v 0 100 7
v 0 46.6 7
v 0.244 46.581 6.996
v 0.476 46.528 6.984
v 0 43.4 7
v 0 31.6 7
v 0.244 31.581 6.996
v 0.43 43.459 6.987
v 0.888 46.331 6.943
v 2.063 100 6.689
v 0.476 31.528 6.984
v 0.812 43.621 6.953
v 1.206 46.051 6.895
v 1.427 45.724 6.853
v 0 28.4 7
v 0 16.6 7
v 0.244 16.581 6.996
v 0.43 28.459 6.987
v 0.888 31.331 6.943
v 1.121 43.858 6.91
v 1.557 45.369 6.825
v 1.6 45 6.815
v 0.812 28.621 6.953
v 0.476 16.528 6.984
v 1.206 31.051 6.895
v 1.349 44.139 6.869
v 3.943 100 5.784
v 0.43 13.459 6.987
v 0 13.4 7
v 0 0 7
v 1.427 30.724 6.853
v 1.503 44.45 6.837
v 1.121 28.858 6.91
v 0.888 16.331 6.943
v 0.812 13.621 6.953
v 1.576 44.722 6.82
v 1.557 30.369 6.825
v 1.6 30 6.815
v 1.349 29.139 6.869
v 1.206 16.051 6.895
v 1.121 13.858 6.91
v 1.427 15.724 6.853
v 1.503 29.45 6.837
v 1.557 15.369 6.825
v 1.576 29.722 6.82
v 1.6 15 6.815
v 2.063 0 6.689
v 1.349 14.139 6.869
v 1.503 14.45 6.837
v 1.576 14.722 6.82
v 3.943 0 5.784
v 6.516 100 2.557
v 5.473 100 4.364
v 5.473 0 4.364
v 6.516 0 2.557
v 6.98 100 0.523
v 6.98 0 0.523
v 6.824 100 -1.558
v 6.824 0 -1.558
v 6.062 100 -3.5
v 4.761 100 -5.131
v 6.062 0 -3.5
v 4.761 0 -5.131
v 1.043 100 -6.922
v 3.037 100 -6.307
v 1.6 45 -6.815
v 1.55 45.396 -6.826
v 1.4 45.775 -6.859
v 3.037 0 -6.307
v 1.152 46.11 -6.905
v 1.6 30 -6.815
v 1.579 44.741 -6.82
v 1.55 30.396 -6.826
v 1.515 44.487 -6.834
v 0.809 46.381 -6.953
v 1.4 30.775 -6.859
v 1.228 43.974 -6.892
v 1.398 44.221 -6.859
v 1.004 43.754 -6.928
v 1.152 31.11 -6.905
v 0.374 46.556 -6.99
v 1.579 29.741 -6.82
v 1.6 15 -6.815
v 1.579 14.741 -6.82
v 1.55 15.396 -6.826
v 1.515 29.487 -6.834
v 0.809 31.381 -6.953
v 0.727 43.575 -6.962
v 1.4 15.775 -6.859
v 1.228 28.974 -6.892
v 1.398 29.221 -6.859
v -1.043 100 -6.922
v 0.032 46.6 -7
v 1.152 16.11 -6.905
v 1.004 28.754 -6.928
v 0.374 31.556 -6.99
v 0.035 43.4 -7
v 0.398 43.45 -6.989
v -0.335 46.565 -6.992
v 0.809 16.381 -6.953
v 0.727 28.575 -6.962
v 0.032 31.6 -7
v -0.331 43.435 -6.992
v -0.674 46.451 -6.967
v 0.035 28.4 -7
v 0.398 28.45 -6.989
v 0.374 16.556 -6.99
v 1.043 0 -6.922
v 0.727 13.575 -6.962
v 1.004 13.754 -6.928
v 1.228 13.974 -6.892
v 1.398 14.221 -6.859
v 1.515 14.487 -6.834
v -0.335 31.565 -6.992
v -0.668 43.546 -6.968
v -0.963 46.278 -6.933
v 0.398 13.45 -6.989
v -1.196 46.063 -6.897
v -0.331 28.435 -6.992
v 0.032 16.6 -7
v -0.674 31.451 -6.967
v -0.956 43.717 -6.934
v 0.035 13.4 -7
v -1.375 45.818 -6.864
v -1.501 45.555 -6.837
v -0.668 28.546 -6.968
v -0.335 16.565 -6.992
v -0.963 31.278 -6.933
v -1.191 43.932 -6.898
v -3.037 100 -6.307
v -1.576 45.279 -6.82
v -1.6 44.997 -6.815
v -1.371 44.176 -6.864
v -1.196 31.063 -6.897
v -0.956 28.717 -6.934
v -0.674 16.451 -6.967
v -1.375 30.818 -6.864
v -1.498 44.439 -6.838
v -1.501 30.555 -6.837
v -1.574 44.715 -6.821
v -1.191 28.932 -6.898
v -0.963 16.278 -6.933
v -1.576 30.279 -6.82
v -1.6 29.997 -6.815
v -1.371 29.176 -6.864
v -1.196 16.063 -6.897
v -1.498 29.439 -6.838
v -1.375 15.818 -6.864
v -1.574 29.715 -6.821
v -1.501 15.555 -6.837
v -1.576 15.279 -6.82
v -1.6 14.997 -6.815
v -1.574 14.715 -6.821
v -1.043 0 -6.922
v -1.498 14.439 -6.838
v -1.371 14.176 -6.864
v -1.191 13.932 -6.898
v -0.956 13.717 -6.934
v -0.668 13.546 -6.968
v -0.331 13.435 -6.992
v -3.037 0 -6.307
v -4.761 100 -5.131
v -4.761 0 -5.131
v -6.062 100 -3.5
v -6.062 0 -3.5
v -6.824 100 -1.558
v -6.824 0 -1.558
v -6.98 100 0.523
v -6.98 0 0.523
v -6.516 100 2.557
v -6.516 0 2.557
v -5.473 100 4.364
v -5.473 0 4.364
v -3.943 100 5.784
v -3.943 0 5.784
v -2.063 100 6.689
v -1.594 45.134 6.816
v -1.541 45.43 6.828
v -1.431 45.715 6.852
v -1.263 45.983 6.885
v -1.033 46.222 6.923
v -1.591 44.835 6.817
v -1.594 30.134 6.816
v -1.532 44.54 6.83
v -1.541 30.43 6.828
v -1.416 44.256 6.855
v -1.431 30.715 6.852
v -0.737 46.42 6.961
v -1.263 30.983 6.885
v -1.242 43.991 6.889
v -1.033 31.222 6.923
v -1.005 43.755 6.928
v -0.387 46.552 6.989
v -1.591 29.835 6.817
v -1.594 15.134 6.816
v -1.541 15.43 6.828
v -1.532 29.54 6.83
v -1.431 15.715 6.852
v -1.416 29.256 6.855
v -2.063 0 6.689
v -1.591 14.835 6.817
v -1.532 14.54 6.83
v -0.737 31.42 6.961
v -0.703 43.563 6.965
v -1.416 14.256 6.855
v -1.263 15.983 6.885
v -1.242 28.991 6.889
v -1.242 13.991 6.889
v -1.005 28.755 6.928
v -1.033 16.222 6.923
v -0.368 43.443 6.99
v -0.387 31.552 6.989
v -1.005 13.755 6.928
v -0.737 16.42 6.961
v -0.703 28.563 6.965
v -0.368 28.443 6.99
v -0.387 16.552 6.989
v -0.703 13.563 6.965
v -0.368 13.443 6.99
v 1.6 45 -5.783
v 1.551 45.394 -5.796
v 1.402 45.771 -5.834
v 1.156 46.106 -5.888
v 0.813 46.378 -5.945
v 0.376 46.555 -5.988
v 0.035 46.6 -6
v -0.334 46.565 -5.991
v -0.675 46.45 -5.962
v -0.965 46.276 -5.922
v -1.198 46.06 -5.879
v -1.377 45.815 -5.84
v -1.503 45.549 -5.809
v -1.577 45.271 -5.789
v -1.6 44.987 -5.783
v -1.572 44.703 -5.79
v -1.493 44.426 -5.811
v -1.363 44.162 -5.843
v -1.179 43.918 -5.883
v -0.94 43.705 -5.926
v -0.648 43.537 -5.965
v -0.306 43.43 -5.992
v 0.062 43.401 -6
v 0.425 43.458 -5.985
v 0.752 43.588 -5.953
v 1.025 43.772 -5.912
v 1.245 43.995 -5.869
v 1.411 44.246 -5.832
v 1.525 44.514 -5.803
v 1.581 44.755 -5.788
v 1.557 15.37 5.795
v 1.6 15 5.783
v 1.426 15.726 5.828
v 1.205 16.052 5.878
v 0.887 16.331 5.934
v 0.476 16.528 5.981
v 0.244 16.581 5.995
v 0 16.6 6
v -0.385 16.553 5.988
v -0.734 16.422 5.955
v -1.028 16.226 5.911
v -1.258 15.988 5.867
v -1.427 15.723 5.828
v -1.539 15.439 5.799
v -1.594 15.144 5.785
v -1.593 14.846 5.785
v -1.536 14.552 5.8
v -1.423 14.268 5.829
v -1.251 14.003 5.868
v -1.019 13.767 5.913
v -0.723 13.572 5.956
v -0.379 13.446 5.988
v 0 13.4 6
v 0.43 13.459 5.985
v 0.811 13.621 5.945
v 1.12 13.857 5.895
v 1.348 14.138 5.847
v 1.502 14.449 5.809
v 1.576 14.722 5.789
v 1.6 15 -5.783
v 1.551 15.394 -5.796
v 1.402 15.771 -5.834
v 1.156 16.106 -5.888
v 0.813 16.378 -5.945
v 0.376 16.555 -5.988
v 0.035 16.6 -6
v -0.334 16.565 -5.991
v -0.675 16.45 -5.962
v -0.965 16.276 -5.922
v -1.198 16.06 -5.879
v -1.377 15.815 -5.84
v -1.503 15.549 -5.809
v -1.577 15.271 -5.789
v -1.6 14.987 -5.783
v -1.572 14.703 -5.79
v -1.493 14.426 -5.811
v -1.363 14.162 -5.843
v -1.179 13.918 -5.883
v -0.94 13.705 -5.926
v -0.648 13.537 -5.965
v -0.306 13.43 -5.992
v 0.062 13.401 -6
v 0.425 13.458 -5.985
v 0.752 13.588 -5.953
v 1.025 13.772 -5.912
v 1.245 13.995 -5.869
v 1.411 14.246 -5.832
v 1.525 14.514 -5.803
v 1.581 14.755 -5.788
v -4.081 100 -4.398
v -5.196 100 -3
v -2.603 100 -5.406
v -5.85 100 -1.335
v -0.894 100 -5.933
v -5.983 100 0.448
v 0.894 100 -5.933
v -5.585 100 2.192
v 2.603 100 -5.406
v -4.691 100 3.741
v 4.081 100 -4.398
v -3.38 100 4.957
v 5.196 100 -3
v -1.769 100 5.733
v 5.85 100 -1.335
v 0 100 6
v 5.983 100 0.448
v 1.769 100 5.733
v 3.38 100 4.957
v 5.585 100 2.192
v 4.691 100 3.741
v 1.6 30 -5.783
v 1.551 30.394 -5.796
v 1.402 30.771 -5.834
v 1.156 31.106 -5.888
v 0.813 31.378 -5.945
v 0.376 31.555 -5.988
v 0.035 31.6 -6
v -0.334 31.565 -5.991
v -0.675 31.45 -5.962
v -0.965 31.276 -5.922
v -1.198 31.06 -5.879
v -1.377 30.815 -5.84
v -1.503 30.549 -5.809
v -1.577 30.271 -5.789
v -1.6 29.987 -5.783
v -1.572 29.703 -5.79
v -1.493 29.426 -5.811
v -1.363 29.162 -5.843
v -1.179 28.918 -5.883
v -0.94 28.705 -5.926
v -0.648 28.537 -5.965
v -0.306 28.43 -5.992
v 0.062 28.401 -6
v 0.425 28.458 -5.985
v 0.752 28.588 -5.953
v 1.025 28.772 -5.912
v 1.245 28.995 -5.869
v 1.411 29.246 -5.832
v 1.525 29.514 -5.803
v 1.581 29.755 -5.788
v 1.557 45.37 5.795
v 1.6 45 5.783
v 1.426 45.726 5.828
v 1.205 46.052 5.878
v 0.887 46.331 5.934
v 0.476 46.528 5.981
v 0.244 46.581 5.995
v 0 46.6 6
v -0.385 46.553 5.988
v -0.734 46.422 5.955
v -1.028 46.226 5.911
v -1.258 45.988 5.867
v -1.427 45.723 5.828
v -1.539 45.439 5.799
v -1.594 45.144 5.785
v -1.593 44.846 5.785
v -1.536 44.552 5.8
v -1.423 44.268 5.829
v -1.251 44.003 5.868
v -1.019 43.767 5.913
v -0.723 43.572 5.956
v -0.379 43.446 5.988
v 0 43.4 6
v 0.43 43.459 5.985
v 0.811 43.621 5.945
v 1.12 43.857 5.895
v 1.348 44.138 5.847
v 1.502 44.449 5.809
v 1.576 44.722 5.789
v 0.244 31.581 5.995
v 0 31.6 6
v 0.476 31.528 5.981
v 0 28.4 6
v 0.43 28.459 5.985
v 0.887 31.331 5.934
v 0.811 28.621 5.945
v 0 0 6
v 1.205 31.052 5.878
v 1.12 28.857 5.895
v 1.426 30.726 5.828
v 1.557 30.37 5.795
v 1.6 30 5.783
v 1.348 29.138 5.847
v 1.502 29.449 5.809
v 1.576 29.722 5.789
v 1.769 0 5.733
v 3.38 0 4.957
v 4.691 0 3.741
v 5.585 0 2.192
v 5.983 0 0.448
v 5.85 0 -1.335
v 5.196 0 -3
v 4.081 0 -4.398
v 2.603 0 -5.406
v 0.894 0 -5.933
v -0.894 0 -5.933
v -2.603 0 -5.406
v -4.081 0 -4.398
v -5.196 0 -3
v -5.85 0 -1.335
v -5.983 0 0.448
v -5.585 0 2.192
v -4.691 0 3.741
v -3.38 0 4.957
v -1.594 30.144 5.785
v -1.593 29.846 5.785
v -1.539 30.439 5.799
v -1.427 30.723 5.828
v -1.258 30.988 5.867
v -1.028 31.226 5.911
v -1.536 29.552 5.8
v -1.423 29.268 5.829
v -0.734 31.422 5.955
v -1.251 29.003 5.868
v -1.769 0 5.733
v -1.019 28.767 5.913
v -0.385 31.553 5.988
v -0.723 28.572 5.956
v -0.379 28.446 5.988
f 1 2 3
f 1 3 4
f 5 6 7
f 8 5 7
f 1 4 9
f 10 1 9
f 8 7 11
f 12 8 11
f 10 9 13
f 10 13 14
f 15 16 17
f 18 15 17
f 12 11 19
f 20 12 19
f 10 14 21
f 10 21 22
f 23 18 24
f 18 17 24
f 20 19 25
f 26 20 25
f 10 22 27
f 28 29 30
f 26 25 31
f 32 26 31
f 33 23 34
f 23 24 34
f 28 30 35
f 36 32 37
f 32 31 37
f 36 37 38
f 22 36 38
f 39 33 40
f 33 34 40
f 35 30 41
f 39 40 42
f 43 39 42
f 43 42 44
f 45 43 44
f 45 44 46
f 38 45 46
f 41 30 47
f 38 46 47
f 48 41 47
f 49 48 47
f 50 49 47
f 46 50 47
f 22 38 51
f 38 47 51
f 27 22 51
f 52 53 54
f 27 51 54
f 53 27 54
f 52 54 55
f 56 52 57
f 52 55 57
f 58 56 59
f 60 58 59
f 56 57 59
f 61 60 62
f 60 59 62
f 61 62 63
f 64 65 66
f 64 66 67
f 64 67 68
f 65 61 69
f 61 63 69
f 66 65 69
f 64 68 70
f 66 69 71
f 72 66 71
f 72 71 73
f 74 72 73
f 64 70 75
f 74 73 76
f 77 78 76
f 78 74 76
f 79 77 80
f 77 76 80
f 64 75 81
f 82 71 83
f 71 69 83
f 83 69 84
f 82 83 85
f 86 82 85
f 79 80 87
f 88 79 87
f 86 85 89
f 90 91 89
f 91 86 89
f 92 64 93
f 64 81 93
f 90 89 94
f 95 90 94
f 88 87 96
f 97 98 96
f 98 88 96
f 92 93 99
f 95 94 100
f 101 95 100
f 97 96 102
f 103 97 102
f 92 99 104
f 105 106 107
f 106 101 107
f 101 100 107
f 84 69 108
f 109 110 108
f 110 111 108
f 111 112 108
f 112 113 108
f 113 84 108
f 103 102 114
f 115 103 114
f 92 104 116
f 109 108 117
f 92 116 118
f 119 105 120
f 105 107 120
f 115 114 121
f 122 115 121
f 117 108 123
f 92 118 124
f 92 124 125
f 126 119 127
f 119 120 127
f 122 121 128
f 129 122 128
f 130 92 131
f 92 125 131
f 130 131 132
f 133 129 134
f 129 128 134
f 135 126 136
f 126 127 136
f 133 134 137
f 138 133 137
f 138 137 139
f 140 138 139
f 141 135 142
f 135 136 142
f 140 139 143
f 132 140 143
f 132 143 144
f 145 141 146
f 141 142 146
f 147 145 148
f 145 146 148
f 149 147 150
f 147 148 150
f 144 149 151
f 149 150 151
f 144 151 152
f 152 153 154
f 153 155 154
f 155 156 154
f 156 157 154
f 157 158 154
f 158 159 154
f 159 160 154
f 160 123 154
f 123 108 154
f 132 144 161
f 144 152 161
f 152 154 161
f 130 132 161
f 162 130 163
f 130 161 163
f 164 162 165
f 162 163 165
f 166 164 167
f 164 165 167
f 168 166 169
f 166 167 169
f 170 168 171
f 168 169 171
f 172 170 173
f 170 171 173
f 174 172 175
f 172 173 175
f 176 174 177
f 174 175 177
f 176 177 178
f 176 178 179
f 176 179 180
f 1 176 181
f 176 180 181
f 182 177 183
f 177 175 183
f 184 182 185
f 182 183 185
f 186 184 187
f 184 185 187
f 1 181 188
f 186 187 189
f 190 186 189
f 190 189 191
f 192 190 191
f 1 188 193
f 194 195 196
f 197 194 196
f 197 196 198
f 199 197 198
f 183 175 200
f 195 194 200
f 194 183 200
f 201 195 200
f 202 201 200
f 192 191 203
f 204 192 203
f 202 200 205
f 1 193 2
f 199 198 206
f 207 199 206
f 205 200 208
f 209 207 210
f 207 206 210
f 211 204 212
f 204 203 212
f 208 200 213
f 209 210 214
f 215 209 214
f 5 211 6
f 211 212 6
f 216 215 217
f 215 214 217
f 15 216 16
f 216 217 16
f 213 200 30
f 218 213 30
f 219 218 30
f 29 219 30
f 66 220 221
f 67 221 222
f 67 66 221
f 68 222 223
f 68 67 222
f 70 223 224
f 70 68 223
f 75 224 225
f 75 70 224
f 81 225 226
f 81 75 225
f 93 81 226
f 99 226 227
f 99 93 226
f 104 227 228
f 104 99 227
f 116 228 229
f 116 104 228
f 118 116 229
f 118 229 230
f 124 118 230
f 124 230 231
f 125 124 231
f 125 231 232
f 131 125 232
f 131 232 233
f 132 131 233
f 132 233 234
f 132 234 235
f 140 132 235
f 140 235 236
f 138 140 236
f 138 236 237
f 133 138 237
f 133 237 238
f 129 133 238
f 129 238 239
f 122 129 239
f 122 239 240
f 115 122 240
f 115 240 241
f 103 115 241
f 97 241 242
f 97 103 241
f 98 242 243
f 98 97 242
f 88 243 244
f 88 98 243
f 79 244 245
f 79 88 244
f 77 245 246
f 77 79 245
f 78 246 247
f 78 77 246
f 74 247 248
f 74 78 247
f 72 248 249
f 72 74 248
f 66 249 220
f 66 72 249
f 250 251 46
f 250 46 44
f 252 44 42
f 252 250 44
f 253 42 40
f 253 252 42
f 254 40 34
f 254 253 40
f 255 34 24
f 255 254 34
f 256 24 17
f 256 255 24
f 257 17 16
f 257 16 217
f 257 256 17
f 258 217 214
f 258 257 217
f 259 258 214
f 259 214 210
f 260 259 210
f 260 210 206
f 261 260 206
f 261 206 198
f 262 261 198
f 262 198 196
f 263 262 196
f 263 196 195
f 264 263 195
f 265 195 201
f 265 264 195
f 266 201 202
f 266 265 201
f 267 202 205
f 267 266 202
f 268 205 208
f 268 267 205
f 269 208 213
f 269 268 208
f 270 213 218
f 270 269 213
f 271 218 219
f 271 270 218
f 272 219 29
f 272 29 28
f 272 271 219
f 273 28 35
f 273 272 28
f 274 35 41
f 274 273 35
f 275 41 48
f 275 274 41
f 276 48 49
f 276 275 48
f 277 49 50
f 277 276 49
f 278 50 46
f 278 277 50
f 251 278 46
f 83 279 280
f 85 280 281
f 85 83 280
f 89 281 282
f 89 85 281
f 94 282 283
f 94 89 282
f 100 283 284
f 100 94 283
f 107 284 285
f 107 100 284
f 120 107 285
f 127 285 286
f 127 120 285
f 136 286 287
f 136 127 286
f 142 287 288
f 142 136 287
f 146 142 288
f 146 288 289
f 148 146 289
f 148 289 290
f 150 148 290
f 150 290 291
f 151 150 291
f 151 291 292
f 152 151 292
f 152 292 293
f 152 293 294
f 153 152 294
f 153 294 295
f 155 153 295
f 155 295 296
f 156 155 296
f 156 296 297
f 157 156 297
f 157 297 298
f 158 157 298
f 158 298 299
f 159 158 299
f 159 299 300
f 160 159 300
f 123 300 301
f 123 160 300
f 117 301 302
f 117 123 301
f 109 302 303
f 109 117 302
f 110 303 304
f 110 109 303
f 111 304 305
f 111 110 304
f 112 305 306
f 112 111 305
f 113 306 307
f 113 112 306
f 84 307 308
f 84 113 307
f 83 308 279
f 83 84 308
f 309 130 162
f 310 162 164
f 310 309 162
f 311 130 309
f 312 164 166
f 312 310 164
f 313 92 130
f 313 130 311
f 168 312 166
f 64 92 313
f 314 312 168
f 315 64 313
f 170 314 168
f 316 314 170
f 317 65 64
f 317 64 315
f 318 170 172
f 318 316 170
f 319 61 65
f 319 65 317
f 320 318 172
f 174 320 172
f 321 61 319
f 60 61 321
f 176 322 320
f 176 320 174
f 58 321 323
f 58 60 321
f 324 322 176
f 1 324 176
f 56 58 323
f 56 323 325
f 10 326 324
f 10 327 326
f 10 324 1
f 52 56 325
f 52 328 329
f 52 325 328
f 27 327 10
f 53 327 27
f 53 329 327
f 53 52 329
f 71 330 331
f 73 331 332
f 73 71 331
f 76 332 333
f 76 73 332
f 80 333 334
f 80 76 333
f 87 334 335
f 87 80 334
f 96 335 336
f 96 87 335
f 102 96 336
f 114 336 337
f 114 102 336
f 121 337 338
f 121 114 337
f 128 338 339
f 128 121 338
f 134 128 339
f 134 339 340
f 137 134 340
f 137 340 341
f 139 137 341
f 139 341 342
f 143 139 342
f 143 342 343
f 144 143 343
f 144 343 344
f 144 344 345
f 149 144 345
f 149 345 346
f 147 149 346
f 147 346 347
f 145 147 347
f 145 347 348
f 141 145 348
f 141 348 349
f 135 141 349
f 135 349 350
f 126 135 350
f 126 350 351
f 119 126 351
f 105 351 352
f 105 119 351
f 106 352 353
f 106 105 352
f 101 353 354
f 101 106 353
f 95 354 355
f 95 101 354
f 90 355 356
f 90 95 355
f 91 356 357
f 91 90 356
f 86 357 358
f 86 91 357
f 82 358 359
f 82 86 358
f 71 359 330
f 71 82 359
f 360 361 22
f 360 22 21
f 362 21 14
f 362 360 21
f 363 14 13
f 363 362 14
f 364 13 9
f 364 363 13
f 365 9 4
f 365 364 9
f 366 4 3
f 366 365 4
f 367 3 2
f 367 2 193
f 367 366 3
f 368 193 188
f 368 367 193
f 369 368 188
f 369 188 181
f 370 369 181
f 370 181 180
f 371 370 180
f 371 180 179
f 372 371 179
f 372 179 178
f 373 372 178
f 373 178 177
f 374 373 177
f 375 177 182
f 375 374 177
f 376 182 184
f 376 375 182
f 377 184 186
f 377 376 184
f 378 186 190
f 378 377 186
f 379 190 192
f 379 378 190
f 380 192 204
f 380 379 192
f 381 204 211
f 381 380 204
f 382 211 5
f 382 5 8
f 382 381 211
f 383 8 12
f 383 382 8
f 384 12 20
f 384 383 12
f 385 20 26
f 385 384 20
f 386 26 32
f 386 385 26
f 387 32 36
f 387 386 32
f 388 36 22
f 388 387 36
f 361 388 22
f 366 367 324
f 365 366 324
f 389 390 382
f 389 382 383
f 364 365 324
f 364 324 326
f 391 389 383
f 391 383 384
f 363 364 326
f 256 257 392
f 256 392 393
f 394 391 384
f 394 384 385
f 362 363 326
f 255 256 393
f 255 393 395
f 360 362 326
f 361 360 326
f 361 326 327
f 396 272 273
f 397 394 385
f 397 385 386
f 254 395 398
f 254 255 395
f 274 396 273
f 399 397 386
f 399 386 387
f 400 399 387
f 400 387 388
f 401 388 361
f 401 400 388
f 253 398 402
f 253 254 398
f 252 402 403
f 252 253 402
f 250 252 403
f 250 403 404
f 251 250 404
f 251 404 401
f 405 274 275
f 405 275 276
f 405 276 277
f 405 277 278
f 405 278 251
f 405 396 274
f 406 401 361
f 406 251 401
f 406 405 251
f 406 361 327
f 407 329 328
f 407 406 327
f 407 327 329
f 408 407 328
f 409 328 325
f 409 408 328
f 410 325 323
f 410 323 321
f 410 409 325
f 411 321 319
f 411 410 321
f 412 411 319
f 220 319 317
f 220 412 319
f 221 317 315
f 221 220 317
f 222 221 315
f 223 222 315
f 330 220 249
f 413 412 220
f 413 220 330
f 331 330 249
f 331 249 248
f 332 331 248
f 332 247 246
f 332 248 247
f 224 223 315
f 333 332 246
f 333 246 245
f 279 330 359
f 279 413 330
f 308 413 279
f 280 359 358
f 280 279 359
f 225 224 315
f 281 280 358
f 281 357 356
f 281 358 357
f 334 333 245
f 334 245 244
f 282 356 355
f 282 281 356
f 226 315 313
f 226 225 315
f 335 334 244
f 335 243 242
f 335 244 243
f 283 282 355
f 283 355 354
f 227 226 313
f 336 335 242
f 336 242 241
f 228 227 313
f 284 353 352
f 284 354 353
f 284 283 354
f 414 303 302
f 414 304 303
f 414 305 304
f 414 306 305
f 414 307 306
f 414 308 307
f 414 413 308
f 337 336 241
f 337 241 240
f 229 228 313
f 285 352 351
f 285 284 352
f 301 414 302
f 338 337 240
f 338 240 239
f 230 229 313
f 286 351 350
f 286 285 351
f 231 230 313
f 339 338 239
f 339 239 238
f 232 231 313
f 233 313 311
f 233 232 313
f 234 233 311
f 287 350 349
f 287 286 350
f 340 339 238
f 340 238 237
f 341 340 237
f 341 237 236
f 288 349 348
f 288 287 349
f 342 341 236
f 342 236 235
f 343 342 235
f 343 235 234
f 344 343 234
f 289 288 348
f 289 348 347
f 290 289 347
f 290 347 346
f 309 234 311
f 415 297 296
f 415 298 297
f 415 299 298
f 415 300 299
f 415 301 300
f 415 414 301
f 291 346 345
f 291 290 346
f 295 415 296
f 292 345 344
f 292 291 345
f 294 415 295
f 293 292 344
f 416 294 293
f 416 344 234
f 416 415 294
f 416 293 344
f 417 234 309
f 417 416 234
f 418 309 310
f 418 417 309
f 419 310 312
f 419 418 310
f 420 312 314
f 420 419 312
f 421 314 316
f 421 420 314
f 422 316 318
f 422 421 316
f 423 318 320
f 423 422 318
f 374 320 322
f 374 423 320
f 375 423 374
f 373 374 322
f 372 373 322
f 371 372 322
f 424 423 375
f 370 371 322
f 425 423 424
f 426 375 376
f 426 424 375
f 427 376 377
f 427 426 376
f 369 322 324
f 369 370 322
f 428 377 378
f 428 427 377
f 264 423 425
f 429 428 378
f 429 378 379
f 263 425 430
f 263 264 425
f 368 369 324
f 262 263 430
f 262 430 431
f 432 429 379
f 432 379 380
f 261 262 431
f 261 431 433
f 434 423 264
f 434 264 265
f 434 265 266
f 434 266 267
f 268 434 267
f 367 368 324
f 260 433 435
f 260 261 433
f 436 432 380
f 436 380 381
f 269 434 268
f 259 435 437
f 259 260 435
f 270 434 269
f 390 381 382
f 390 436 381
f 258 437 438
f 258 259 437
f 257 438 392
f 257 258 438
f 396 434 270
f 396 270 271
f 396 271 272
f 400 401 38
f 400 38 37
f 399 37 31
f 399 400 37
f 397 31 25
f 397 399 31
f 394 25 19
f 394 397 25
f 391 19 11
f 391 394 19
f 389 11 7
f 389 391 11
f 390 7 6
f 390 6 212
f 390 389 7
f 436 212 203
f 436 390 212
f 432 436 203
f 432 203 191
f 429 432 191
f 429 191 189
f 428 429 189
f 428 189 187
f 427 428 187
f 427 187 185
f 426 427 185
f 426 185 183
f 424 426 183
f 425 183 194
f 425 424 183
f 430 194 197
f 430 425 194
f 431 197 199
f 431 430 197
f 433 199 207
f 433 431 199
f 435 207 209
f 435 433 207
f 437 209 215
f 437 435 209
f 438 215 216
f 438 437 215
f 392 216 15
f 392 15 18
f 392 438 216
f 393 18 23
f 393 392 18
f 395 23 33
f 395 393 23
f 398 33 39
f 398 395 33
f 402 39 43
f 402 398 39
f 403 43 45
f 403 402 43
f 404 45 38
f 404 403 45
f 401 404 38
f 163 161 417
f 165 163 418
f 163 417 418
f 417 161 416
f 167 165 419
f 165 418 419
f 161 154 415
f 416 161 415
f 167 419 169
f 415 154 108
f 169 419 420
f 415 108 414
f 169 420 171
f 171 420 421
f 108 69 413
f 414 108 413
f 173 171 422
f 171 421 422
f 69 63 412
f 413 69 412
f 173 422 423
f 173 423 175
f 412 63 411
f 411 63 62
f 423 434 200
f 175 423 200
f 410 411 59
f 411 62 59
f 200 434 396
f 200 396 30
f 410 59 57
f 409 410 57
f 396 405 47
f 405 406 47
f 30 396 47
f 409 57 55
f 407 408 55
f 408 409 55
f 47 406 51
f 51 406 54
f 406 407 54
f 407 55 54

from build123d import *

# Parameters (mm, degrees)
SKETCH_1_R               = 7
SKETCH_1_R_2             = 6
EXTRUDE_1_DEPTH          = 100
CUT_EXTRUDE_1_DEPTH      = 101.488805347
CUT_EXTRUDE_1_DEPTH_BACK = 101.488805347
SKETCH_2_R               = 1.6


with BuildPart() as part:
    # 草图1 → 凸台-拉伸1 (new body)
    with BuildSketch(Plane(origin=(0, 0, 0), x_dir=(1, 0, 0), z_dir=(0, 1, 0))):
        with Locations(Location((0, 0, 0), (0, 0, 270))):
            Circle(SKETCH_1_R)
        with Locations(Location((0, 0, 0), (0, 0, 270))):
            Circle(SKETCH_1_R_2, mode=Mode.SUBTRACT)
    extrude(amount=EXTRUDE_1_DEPTH)

    # 草图2 → 切除-拉伸1 (cut, two sides: drawn at the far end of the back side and taken through both)
    with BuildSketch(Plane.XY.offset(-CUT_EXTRUDE_1_DEPTH_BACK)):
        with Locations((0, 15)):
            Circle(SKETCH_2_R)
        with Locations((0, 30)):
            Circle(SKETCH_2_R)
        with Locations((0, 45)):
            Circle(SKETCH_2_R)
    extrude(amount=CUT_EXTRUDE_1_DEPTH + CUT_EXTRUDE_1_DEPTH_BACK, mode=Mode.SUBTRACT)


solid = part.part
